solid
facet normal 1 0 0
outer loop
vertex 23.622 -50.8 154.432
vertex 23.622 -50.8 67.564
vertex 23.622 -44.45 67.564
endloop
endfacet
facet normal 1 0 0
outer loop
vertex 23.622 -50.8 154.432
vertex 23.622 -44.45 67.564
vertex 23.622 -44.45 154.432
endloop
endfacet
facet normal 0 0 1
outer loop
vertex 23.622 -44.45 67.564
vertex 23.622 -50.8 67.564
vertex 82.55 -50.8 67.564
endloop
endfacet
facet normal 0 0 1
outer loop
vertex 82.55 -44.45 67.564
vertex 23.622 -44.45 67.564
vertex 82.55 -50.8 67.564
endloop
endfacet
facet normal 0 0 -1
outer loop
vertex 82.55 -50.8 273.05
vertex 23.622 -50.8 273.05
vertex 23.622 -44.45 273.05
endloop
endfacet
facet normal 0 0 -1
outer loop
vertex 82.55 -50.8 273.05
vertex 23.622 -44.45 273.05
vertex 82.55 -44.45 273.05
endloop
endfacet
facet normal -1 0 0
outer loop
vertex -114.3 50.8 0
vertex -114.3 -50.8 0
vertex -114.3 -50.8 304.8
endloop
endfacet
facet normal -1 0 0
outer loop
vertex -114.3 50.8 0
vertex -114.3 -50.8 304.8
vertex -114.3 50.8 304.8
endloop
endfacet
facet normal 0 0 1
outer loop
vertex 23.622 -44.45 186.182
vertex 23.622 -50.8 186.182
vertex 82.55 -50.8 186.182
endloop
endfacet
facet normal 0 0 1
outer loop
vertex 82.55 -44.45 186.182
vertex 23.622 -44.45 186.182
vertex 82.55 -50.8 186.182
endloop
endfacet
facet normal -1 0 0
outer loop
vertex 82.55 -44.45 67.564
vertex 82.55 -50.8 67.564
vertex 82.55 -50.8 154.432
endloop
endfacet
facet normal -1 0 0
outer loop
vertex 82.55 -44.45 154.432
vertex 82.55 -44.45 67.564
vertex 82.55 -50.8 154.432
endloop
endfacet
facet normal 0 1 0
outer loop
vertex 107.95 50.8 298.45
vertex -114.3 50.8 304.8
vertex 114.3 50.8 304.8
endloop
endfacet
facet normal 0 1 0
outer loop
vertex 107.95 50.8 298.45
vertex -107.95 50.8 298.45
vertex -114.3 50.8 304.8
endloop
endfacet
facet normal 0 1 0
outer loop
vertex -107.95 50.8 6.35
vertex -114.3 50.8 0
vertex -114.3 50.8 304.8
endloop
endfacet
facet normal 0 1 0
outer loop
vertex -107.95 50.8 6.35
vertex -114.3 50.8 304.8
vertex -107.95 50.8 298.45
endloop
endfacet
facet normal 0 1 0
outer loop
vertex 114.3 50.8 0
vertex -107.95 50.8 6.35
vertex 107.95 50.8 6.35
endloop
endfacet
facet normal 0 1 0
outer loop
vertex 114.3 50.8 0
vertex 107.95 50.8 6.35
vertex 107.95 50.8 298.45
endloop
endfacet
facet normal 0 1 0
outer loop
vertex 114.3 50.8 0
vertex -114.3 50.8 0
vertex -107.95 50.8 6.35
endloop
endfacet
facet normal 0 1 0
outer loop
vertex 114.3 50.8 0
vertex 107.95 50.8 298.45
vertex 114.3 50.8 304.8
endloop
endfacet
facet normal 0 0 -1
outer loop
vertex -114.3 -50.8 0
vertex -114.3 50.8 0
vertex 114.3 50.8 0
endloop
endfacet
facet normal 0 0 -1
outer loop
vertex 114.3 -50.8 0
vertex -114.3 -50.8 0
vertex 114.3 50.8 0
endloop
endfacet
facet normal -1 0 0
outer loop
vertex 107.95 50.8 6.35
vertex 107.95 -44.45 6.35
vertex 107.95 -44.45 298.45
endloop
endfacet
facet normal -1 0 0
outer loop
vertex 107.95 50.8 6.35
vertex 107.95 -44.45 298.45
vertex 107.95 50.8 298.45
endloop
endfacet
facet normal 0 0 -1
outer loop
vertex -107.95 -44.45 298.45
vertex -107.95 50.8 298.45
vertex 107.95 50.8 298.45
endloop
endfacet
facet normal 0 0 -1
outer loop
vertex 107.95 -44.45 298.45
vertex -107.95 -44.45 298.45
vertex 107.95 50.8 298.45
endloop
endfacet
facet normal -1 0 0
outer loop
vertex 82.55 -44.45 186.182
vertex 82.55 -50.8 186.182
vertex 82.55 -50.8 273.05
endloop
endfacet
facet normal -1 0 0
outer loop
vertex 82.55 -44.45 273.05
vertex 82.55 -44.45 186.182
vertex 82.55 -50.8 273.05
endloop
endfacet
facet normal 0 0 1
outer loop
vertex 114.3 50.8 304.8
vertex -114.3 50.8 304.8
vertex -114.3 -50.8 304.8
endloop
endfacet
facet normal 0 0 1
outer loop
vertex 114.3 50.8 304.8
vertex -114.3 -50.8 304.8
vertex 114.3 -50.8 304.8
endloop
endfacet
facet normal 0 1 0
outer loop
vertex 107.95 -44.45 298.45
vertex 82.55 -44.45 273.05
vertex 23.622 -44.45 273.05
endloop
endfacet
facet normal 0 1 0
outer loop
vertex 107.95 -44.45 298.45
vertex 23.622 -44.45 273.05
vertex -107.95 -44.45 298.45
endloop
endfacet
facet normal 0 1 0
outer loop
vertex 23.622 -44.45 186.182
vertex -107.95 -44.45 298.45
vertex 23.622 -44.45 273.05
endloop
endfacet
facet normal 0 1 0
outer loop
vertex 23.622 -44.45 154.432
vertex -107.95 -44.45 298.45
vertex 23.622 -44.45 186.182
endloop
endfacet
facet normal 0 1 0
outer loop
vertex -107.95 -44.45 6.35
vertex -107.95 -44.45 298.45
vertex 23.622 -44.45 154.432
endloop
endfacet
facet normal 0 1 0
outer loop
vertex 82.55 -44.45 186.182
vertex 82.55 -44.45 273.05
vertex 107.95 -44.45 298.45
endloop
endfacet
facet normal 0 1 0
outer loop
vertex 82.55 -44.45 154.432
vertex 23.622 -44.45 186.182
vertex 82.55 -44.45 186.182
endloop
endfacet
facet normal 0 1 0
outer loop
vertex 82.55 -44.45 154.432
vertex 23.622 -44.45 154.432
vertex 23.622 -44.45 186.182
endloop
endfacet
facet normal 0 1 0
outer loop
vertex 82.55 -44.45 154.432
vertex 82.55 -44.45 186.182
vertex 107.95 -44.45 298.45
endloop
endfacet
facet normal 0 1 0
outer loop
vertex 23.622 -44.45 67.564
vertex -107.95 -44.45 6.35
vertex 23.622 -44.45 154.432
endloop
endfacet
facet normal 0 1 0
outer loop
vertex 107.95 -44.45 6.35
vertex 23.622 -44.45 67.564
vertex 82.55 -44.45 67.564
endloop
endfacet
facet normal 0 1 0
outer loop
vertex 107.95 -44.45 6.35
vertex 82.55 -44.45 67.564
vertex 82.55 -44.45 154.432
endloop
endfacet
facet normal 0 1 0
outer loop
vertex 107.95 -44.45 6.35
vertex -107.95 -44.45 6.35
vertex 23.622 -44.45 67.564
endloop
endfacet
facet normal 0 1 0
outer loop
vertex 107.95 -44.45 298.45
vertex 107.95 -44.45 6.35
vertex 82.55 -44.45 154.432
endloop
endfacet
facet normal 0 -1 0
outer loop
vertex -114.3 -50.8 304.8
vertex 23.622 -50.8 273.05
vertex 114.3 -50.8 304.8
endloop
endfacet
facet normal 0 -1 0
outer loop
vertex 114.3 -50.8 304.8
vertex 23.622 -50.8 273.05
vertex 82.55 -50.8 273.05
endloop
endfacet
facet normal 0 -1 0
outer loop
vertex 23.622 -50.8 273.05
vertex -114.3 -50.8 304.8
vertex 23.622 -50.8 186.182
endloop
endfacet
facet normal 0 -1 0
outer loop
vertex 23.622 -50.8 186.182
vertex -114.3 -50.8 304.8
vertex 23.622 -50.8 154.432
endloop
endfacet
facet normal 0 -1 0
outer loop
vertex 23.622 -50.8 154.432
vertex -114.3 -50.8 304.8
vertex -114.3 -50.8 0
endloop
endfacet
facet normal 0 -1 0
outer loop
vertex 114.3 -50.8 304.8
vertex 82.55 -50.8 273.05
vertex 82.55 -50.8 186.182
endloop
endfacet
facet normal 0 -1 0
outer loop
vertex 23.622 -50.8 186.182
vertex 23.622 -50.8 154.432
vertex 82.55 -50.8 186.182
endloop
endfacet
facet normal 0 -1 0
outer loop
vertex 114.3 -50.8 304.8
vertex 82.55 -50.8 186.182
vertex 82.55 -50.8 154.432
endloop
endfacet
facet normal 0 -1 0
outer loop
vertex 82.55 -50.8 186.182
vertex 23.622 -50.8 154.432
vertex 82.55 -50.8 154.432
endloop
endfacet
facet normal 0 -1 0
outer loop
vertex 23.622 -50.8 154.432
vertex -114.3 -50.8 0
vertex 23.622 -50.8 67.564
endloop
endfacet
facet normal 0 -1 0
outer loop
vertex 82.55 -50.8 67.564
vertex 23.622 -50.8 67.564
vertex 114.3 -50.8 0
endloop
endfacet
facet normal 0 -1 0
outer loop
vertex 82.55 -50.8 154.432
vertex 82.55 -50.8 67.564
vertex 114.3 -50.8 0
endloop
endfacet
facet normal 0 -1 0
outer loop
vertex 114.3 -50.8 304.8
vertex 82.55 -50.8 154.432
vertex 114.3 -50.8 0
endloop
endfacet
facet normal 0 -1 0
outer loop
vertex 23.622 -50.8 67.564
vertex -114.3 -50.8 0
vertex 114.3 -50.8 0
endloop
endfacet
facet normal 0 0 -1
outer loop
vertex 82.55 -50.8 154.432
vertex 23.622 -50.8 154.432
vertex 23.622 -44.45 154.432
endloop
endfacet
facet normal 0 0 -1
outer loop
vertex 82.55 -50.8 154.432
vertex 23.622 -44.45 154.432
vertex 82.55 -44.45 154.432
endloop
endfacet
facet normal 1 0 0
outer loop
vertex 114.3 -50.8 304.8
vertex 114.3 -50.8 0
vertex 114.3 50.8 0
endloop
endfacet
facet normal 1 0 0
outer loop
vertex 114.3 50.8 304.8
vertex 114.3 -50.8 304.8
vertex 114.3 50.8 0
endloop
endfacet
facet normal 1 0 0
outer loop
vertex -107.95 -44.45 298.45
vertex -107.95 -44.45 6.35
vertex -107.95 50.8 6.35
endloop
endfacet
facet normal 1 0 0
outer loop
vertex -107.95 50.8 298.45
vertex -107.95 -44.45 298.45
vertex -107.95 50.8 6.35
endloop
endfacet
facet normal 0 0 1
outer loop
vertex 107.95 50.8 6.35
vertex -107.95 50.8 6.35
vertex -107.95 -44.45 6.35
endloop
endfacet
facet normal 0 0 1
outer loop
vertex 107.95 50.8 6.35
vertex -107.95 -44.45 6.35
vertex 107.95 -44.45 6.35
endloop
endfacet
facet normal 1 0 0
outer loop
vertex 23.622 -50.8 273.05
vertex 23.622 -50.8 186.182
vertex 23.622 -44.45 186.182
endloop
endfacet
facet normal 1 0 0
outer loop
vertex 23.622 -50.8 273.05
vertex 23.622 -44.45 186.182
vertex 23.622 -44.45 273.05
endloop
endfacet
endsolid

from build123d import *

# Parameters (mm, degrees)
F0_W     = 228.6
F0_H     = 101.6
F1_DEPTH = 304.8
F2_T     = -6.35
F3_W     = 58.928
F3_H     = 86.868
F4_DEPTH = 25.4


with BuildPart() as f1:
    # F0 (on Top) → F1 (new body)
    with BuildSketch(Plane.XY):
        Rectangle(F0_W, F0_H)
    extrude(amount=F1_DEPTH)

    # F2
    f2_openings = [f1.faces().sort_by_distance(p)[0] for p in [
        (0, 50.8, 152.4),
    ]]
    offset(amount=F2_T, openings=f2_openings)

    # F3 (on face) → F4 (cut)
    with BuildSketch(Plane.XZ.offset(50.8)):
        with Locations((53.086, 229.616)):
            Rectangle(F3_W, F3_H)
        with Locations((53.086, 110.998)):
            Rectangle(F3_W, F3_H)
    extrude(amount=-F4_DEPTH, mode=Mode.SUBTRACT)


solid = f1.part
